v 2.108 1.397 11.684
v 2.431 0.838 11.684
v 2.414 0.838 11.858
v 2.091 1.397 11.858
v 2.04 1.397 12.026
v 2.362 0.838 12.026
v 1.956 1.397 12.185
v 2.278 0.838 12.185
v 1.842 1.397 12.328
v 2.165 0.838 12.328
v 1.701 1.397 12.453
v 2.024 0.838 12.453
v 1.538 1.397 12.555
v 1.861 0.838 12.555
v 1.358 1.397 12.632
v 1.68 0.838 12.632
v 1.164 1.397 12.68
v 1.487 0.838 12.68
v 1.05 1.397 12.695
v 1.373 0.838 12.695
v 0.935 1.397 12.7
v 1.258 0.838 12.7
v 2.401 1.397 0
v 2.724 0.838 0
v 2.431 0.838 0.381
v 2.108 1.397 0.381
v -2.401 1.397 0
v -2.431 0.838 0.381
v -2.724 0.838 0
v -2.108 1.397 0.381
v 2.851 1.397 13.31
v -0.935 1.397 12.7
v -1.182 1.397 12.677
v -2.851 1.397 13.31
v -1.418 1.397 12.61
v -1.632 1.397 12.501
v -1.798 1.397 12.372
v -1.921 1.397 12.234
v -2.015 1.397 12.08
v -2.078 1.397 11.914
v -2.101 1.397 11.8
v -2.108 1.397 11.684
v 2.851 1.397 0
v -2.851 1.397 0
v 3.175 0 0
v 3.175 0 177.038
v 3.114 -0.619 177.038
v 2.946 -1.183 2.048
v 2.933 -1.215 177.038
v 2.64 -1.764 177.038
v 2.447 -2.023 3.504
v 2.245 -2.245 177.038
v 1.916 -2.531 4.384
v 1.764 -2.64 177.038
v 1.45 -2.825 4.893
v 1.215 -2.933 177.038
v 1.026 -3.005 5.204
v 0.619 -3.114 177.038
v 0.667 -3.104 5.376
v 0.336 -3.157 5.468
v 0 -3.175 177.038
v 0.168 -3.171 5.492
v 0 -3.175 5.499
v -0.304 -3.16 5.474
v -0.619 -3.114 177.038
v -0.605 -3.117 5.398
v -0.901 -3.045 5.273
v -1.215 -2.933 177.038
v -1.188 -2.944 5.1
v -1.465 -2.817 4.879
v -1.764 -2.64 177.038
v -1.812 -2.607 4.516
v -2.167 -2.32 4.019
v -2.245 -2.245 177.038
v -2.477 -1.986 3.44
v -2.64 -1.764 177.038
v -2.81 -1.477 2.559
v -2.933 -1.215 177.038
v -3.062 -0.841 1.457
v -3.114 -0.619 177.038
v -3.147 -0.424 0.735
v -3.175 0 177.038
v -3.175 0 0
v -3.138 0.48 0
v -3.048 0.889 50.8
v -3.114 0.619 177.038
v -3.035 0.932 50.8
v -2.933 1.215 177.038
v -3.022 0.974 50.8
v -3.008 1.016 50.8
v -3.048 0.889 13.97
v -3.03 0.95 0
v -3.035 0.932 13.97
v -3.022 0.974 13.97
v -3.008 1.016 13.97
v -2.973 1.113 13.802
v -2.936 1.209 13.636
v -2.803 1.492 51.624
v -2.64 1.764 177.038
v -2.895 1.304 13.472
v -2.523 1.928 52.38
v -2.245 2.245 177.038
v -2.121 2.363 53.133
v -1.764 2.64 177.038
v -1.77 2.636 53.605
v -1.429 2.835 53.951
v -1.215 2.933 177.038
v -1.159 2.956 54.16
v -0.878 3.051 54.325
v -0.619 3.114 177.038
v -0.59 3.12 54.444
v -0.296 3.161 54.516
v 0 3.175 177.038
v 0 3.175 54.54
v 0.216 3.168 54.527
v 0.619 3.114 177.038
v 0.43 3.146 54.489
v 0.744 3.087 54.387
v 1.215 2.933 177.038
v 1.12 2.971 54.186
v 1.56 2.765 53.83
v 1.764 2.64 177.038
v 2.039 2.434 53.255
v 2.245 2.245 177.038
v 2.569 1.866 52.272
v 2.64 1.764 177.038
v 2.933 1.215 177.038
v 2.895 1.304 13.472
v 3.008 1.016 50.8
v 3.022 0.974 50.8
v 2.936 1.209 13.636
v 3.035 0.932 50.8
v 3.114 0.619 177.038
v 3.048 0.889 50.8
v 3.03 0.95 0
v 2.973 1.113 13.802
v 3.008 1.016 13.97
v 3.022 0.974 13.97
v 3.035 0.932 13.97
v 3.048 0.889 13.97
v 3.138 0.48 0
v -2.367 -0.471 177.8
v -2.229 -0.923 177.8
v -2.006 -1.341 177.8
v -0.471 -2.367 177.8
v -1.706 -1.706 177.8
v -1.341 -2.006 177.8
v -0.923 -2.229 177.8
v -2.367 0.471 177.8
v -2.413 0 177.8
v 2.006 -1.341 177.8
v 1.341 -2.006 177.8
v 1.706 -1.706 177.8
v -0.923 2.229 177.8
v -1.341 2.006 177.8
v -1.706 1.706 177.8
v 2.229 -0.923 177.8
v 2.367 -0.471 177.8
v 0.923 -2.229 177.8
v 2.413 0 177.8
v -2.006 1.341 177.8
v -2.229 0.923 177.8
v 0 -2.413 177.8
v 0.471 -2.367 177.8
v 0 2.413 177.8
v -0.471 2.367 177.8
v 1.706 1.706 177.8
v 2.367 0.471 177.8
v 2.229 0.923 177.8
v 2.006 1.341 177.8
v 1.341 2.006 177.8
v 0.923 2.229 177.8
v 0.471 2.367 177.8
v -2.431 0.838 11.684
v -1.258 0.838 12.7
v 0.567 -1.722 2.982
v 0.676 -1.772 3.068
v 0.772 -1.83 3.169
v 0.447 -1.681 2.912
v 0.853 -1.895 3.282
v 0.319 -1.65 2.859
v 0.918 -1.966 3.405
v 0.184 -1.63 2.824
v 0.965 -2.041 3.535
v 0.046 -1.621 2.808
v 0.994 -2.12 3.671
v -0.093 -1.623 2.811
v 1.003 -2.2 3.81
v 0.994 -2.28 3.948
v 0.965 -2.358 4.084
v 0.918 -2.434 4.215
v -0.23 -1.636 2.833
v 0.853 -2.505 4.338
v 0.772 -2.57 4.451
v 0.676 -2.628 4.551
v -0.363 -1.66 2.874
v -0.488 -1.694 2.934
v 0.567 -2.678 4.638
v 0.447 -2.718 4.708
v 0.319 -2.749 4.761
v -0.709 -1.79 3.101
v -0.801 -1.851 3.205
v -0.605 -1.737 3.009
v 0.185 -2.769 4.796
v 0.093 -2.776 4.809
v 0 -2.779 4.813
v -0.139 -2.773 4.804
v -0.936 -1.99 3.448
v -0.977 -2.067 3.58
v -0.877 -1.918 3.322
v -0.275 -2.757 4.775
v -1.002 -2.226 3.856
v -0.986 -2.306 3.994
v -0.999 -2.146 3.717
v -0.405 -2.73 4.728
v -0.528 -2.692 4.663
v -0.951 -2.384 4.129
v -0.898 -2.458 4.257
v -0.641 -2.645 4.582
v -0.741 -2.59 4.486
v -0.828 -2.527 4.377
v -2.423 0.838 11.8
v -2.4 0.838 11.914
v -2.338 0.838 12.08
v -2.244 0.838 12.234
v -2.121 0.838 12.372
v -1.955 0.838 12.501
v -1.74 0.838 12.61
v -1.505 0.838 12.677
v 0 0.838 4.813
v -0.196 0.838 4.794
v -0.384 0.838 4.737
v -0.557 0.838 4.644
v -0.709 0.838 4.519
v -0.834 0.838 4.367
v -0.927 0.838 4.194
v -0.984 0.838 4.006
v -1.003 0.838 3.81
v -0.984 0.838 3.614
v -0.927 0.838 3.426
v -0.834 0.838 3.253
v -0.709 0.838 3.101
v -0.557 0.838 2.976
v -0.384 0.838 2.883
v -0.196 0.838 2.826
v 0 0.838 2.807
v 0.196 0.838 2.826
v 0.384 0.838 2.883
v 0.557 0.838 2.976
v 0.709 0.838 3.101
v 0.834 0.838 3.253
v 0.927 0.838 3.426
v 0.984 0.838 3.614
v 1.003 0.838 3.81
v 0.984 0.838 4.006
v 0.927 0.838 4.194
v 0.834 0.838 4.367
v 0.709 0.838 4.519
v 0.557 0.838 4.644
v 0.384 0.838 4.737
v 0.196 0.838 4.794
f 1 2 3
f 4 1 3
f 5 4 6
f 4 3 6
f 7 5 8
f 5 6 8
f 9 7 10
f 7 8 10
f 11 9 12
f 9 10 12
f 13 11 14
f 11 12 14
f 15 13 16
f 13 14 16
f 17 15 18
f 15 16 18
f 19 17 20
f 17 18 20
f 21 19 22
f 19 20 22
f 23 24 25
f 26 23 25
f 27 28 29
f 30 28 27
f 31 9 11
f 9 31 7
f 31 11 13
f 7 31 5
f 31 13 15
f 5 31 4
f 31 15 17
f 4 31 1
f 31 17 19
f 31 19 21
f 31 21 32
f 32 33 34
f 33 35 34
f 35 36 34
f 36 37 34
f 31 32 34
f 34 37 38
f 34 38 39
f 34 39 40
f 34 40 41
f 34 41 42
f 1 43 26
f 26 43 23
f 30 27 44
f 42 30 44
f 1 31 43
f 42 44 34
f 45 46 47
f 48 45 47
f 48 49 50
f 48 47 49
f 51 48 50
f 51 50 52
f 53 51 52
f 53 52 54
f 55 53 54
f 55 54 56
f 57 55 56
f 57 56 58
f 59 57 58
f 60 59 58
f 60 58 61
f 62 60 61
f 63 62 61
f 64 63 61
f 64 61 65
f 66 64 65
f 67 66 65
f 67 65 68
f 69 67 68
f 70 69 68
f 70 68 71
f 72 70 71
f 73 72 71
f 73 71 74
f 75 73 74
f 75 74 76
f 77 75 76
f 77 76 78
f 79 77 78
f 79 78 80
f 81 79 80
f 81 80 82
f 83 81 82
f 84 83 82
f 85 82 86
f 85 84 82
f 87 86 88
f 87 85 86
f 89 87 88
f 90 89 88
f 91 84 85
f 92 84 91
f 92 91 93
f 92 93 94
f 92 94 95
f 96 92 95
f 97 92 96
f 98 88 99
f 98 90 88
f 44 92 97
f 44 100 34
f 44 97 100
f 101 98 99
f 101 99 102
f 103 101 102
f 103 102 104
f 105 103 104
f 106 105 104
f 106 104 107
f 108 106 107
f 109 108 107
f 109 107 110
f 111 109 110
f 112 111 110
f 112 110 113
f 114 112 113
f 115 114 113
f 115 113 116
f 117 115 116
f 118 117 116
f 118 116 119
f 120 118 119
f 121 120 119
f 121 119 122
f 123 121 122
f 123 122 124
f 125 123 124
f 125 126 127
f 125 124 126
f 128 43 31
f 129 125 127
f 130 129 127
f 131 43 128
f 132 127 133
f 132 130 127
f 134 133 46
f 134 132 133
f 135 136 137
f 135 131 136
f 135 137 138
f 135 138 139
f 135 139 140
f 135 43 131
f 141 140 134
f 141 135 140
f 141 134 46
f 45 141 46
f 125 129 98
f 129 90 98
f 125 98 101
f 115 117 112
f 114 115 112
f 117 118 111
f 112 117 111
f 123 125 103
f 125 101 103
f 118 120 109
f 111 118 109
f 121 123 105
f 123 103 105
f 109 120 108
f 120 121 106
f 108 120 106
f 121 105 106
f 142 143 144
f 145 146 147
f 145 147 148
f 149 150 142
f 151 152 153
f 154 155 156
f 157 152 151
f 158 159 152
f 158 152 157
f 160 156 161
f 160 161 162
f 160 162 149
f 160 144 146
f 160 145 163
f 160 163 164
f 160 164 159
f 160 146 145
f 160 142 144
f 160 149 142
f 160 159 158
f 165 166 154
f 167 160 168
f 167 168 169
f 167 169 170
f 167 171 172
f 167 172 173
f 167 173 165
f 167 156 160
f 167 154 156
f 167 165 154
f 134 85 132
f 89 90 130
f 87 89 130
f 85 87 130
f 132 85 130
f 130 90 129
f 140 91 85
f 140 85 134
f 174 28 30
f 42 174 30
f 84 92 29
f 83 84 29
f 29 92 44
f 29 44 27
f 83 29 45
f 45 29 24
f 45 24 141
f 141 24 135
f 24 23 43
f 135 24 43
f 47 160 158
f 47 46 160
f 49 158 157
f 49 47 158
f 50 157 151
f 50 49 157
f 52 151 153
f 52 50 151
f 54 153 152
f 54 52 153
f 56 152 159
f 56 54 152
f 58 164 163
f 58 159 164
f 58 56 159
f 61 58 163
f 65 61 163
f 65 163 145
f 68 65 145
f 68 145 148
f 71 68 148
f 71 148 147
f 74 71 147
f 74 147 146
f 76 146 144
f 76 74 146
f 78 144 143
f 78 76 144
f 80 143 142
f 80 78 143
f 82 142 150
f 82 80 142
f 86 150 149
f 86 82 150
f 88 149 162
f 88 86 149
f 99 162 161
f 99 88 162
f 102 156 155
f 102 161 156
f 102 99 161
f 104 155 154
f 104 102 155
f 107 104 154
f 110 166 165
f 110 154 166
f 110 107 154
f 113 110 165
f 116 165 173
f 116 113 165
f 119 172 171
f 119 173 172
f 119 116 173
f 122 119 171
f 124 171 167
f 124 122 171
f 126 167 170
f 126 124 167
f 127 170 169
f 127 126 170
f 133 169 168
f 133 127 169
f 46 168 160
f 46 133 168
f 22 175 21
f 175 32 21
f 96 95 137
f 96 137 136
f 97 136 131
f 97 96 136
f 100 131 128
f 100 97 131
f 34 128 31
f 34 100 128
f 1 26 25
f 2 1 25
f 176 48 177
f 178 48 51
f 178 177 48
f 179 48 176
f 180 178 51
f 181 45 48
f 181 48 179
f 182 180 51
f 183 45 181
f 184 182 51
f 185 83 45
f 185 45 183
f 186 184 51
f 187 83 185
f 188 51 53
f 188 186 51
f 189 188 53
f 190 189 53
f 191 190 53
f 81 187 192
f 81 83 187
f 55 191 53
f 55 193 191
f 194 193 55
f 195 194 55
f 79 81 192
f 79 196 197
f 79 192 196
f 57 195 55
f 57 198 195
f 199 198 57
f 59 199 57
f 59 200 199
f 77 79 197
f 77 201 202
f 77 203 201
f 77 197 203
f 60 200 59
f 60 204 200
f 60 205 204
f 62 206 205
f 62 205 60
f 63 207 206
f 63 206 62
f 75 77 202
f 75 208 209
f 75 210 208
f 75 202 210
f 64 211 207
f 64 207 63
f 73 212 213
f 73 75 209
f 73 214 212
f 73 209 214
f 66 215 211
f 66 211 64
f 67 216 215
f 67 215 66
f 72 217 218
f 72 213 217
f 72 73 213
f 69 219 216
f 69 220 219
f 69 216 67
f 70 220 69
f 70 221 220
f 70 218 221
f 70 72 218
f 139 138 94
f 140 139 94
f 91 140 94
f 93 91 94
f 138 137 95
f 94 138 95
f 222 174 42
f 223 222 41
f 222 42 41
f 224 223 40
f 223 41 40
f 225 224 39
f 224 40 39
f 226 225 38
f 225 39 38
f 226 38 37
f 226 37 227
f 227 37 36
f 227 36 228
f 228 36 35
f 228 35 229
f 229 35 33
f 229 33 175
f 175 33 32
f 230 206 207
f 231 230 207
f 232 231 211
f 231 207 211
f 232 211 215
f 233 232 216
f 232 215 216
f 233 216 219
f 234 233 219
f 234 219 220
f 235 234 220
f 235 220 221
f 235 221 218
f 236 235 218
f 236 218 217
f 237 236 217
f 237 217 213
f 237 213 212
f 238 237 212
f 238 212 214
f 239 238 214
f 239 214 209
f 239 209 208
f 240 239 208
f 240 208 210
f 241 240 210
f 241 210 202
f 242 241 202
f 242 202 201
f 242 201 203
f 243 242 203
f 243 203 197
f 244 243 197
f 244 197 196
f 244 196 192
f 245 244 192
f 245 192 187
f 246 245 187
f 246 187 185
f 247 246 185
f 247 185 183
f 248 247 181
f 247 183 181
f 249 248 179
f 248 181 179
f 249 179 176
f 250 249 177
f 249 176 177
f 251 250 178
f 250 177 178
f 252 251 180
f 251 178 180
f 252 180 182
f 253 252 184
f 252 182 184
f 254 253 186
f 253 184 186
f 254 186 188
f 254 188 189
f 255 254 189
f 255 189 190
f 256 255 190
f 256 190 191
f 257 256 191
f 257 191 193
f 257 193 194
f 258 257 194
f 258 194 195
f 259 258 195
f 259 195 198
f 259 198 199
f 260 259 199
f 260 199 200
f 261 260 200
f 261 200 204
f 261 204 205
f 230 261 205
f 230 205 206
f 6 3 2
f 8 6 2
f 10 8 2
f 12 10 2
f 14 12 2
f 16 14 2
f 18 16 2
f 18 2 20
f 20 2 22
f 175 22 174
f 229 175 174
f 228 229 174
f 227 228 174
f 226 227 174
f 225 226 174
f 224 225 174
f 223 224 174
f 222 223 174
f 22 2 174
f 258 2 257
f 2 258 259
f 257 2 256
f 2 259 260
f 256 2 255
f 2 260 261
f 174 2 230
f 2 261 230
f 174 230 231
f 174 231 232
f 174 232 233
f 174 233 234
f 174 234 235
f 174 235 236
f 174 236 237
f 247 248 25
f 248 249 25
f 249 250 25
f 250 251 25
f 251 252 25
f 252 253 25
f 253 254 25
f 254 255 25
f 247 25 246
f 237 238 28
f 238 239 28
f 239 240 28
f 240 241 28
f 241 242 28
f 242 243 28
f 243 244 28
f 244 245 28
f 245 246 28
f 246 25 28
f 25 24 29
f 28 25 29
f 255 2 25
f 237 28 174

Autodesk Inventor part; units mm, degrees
ref_plane "YZ Plane" through (0, 0, 0) normal (1, 0, 0) x (0, 1, 0)
ref_plane "XZ Plane" through (0, 0, 0) normal (0, 1, 0) x (-1, 0, 0)
ref_plane "XY Plane" through (0, 0, 0) normal (0, 0, 1) x (1, 0, 0)
sketch "Sketch1" plane through (0, 0, 0) normal (0, 0, 1) x (1, 0, 0)
  circle A0 centre (0, 0) radius 3.175
  dimension "d0" = 6.35
extrude "Extrusion1" add sketch "Sketch1" along normal blind 177.8
sketch "Sketch2" plane through (0, 0, 0) normal (0, 0, 1) x (1, 0, 0)
  circle A0 centre (0, 0) radius 3.175 projected
  line L0 (2.5773, 1.8542) -> (-2.5773, 1.8542)
  line L1 (0, 4.445) -> (0, -4.445) projected
  line L2 (-4.445, 0) -> (4.445, 0) projected
  line L3 (2.8511, 1.397) -> (-2.8511, 1.397)
  line L4 (2.1082, 1.397) -> (2.4308, 0.8382)
  line L5 (2.4308, 0.8382) -> (-2.4308, 0.8382)
  line L6 (-2.4308, 0.8382) -> (-2.1082, 1.397)
  line L7 (0, 0) -> (0, 3.175)
  dimension "d6" = 1.397
  dimension "d9" = 60
  dimension "d10" = 4.2164
  dimension "d11" = 0.5588
  dimension "d40" = 0.4572
extrude "Extrusion3" cut sketch "Sketch2" along normal blind 12.7 contours L3 L1 L0 A0 | L1 L3 A0 L0
extrude "Extrusion4" cut sketch "Sketch2" along normal up to surface (12.7 mm away) contours L4 L5 L1 L3 | L5 L6 L3 L1
sketch "Sketch3" plane through (-2.4308, 0.8382, 12.7) normal (0, 1, 0) x (1, 0, 0)
  line L0 (0, 12.7) -> (4.8616, 12.7) projected
  line L1 (2.4308, 48.26) -> (2.4308, -200.66) projected
  point P0 (2.4308, 12.7)
  point P1 (2.4308, 8.89)
  dimension "d14" = 3.81
hole "Hole1" at (0, 0.8382, 3.81) direction (0, -1, 0) diameter 2.0066 end through all
sketch "Sketch4" plane through (0, 0, 0) normal (1, 0, 0) x (0, 1, 0)
  line L0 (0, 213.36) -> (0, -35.56) projected
  line L1 (-3.175, 0) -> (-3.175, 177.8) projected
  line L2 (0, 0) -> (-3.175, 5.4993)
  line L3 (-3.175, 5.4993) -> (-3.175, 0)
  line L4 (-3.175, 0) -> (0, 0)
  dimension "d23" = 30
extrude "Extrusion5" cut sketch "Sketch4" along normal mid plane 12.7
chamfer "Chamfer1" distance 0.254 distance2 0.381 1 edges at (-2.2695, 1.1176, 0) measured on face at (0.8103, 0.2794, 0)
chamfer "Chamfer2" distance 0.254 distance2 0.381 1 edges at (2.2695, 1.1176, 0) measured on face at (0.8103, 0.2794, 0)
chamfer "Chamfer3" distance 0.762 angle 45 1 edges at (-3.175, 0, 177.8)
extrude "Extrusion7" cut sketch "Sketch2" along normal blind 50.8 contours L3 L1 L0 A0 | L0 L1 A0 | L1 L0 A0 | L1 L3 A0 L0
sketch "Sketch6" plane through (-2.1082, 1.397, 12.7) normal (0, 1, 0) x (1, 0, 0)
  line L0 (-0.7429, -38.1) -> (4.9593, -38.1) projected
  line L1 (0, 0) -> (4.2164, 0) projected
  line L2 (2.1082, 48.26) -> (2.1082, -200.66) projected
  line L3 (8.3312, 12.7) -> (-4.1148, 12.7) projected
  line L4 (6.5532, -1.27) -> (-2.3368, -1.27)
  line L5 (-2.3368, -1.27) -> (-2.3368, -38.1)
  line L6 (-2.3368, -38.1) -> (6.5532, -38.1)
  line L7 (6.5532, -38.1) -> (6.5532, -1.27)
  line L8 (6.5532, -1.27) -> (-2.3368, -38.1) construction
  line L9 (-2.3368, -1.27) -> (6.5532, -38.1) construction
  point P0 (2.1082, 12.7)
  point P1 (2.1082, -19.685)
  dimension "d43" = 0
  dimension "d44" = 1.27
  dimension "d45" = 8.89
extrude "Extrusion8" cut sketch "Sketch6" against normal blind 0.508
sketch "Sketch8" plane through (-2.8511, 1.397, 13.97) normal (0, 1, 0) x (1, 0, 0)
  point P0 (2.8511, 13.97)
sketch "Sketch9" plane through (-2.1082, 1.397, 12.7) normal (0, 1, 0) x (1, 0, 0)
  point P0 (2.1082, 12.7)
sketch "Sketch10" plane through (-2.1082, 1.397, 12.7) normal (0, 1, 0) x (1, 0, 0)
  point P0 (2.1082, 12.7)
fillet "Fillet3" radius 1.016 2 edges at (-2.2695, 1.1176, 12.7) (2.2695, 1.1176, 12.7)
sketch "Sketch11" plane through (0, 0, 0) normal (1, 0, 0) x (0, 1, 0)
  line L0 (0.889, 13.97) -> (0.889, 50.8) projected
  line L1 (3.175, 50.8) -> (3.175, 177.038) projected
  line L2 (1.016, 50.8) -> (3.175, 54.5395)
  line L3 (0.889, 13.97) -> (1.397, 13.97) projected
  line L4 (-4.445, 0) -> (4.445, 0) projected
  line L5 (1.016, 13.97) -> (1.397, 13.3101)
  line L6 (1.397, 13.3101) -> (1.397, 13.97)
  line L7 (1.016, 13.97) -> (1.397, 13.97)
  line L8 (0.8382, 12.7) -> (1.397, 12.7) projected
  line L9 (3.175, 54.5395) -> (3.175, 50.8)
  line L10 (3.175, 50.8) -> (0.889, 50.8) projected
  line L11 (1.016, 50.8) -> (3.175, 50.8)
  point P0 (0, 0)
  dimension "d56" = 0.127
  dimension "d57" = 13.97
  dimension "d58" = 0.127
  dimension "d59" = 30
  dimension "d60" = 0.6101
extrude "Extrusion10" cut sketch "Sketch11" along normal mid plane 6.35
properties part number "J007778" material "ALUMINUM, 6061-T651"
